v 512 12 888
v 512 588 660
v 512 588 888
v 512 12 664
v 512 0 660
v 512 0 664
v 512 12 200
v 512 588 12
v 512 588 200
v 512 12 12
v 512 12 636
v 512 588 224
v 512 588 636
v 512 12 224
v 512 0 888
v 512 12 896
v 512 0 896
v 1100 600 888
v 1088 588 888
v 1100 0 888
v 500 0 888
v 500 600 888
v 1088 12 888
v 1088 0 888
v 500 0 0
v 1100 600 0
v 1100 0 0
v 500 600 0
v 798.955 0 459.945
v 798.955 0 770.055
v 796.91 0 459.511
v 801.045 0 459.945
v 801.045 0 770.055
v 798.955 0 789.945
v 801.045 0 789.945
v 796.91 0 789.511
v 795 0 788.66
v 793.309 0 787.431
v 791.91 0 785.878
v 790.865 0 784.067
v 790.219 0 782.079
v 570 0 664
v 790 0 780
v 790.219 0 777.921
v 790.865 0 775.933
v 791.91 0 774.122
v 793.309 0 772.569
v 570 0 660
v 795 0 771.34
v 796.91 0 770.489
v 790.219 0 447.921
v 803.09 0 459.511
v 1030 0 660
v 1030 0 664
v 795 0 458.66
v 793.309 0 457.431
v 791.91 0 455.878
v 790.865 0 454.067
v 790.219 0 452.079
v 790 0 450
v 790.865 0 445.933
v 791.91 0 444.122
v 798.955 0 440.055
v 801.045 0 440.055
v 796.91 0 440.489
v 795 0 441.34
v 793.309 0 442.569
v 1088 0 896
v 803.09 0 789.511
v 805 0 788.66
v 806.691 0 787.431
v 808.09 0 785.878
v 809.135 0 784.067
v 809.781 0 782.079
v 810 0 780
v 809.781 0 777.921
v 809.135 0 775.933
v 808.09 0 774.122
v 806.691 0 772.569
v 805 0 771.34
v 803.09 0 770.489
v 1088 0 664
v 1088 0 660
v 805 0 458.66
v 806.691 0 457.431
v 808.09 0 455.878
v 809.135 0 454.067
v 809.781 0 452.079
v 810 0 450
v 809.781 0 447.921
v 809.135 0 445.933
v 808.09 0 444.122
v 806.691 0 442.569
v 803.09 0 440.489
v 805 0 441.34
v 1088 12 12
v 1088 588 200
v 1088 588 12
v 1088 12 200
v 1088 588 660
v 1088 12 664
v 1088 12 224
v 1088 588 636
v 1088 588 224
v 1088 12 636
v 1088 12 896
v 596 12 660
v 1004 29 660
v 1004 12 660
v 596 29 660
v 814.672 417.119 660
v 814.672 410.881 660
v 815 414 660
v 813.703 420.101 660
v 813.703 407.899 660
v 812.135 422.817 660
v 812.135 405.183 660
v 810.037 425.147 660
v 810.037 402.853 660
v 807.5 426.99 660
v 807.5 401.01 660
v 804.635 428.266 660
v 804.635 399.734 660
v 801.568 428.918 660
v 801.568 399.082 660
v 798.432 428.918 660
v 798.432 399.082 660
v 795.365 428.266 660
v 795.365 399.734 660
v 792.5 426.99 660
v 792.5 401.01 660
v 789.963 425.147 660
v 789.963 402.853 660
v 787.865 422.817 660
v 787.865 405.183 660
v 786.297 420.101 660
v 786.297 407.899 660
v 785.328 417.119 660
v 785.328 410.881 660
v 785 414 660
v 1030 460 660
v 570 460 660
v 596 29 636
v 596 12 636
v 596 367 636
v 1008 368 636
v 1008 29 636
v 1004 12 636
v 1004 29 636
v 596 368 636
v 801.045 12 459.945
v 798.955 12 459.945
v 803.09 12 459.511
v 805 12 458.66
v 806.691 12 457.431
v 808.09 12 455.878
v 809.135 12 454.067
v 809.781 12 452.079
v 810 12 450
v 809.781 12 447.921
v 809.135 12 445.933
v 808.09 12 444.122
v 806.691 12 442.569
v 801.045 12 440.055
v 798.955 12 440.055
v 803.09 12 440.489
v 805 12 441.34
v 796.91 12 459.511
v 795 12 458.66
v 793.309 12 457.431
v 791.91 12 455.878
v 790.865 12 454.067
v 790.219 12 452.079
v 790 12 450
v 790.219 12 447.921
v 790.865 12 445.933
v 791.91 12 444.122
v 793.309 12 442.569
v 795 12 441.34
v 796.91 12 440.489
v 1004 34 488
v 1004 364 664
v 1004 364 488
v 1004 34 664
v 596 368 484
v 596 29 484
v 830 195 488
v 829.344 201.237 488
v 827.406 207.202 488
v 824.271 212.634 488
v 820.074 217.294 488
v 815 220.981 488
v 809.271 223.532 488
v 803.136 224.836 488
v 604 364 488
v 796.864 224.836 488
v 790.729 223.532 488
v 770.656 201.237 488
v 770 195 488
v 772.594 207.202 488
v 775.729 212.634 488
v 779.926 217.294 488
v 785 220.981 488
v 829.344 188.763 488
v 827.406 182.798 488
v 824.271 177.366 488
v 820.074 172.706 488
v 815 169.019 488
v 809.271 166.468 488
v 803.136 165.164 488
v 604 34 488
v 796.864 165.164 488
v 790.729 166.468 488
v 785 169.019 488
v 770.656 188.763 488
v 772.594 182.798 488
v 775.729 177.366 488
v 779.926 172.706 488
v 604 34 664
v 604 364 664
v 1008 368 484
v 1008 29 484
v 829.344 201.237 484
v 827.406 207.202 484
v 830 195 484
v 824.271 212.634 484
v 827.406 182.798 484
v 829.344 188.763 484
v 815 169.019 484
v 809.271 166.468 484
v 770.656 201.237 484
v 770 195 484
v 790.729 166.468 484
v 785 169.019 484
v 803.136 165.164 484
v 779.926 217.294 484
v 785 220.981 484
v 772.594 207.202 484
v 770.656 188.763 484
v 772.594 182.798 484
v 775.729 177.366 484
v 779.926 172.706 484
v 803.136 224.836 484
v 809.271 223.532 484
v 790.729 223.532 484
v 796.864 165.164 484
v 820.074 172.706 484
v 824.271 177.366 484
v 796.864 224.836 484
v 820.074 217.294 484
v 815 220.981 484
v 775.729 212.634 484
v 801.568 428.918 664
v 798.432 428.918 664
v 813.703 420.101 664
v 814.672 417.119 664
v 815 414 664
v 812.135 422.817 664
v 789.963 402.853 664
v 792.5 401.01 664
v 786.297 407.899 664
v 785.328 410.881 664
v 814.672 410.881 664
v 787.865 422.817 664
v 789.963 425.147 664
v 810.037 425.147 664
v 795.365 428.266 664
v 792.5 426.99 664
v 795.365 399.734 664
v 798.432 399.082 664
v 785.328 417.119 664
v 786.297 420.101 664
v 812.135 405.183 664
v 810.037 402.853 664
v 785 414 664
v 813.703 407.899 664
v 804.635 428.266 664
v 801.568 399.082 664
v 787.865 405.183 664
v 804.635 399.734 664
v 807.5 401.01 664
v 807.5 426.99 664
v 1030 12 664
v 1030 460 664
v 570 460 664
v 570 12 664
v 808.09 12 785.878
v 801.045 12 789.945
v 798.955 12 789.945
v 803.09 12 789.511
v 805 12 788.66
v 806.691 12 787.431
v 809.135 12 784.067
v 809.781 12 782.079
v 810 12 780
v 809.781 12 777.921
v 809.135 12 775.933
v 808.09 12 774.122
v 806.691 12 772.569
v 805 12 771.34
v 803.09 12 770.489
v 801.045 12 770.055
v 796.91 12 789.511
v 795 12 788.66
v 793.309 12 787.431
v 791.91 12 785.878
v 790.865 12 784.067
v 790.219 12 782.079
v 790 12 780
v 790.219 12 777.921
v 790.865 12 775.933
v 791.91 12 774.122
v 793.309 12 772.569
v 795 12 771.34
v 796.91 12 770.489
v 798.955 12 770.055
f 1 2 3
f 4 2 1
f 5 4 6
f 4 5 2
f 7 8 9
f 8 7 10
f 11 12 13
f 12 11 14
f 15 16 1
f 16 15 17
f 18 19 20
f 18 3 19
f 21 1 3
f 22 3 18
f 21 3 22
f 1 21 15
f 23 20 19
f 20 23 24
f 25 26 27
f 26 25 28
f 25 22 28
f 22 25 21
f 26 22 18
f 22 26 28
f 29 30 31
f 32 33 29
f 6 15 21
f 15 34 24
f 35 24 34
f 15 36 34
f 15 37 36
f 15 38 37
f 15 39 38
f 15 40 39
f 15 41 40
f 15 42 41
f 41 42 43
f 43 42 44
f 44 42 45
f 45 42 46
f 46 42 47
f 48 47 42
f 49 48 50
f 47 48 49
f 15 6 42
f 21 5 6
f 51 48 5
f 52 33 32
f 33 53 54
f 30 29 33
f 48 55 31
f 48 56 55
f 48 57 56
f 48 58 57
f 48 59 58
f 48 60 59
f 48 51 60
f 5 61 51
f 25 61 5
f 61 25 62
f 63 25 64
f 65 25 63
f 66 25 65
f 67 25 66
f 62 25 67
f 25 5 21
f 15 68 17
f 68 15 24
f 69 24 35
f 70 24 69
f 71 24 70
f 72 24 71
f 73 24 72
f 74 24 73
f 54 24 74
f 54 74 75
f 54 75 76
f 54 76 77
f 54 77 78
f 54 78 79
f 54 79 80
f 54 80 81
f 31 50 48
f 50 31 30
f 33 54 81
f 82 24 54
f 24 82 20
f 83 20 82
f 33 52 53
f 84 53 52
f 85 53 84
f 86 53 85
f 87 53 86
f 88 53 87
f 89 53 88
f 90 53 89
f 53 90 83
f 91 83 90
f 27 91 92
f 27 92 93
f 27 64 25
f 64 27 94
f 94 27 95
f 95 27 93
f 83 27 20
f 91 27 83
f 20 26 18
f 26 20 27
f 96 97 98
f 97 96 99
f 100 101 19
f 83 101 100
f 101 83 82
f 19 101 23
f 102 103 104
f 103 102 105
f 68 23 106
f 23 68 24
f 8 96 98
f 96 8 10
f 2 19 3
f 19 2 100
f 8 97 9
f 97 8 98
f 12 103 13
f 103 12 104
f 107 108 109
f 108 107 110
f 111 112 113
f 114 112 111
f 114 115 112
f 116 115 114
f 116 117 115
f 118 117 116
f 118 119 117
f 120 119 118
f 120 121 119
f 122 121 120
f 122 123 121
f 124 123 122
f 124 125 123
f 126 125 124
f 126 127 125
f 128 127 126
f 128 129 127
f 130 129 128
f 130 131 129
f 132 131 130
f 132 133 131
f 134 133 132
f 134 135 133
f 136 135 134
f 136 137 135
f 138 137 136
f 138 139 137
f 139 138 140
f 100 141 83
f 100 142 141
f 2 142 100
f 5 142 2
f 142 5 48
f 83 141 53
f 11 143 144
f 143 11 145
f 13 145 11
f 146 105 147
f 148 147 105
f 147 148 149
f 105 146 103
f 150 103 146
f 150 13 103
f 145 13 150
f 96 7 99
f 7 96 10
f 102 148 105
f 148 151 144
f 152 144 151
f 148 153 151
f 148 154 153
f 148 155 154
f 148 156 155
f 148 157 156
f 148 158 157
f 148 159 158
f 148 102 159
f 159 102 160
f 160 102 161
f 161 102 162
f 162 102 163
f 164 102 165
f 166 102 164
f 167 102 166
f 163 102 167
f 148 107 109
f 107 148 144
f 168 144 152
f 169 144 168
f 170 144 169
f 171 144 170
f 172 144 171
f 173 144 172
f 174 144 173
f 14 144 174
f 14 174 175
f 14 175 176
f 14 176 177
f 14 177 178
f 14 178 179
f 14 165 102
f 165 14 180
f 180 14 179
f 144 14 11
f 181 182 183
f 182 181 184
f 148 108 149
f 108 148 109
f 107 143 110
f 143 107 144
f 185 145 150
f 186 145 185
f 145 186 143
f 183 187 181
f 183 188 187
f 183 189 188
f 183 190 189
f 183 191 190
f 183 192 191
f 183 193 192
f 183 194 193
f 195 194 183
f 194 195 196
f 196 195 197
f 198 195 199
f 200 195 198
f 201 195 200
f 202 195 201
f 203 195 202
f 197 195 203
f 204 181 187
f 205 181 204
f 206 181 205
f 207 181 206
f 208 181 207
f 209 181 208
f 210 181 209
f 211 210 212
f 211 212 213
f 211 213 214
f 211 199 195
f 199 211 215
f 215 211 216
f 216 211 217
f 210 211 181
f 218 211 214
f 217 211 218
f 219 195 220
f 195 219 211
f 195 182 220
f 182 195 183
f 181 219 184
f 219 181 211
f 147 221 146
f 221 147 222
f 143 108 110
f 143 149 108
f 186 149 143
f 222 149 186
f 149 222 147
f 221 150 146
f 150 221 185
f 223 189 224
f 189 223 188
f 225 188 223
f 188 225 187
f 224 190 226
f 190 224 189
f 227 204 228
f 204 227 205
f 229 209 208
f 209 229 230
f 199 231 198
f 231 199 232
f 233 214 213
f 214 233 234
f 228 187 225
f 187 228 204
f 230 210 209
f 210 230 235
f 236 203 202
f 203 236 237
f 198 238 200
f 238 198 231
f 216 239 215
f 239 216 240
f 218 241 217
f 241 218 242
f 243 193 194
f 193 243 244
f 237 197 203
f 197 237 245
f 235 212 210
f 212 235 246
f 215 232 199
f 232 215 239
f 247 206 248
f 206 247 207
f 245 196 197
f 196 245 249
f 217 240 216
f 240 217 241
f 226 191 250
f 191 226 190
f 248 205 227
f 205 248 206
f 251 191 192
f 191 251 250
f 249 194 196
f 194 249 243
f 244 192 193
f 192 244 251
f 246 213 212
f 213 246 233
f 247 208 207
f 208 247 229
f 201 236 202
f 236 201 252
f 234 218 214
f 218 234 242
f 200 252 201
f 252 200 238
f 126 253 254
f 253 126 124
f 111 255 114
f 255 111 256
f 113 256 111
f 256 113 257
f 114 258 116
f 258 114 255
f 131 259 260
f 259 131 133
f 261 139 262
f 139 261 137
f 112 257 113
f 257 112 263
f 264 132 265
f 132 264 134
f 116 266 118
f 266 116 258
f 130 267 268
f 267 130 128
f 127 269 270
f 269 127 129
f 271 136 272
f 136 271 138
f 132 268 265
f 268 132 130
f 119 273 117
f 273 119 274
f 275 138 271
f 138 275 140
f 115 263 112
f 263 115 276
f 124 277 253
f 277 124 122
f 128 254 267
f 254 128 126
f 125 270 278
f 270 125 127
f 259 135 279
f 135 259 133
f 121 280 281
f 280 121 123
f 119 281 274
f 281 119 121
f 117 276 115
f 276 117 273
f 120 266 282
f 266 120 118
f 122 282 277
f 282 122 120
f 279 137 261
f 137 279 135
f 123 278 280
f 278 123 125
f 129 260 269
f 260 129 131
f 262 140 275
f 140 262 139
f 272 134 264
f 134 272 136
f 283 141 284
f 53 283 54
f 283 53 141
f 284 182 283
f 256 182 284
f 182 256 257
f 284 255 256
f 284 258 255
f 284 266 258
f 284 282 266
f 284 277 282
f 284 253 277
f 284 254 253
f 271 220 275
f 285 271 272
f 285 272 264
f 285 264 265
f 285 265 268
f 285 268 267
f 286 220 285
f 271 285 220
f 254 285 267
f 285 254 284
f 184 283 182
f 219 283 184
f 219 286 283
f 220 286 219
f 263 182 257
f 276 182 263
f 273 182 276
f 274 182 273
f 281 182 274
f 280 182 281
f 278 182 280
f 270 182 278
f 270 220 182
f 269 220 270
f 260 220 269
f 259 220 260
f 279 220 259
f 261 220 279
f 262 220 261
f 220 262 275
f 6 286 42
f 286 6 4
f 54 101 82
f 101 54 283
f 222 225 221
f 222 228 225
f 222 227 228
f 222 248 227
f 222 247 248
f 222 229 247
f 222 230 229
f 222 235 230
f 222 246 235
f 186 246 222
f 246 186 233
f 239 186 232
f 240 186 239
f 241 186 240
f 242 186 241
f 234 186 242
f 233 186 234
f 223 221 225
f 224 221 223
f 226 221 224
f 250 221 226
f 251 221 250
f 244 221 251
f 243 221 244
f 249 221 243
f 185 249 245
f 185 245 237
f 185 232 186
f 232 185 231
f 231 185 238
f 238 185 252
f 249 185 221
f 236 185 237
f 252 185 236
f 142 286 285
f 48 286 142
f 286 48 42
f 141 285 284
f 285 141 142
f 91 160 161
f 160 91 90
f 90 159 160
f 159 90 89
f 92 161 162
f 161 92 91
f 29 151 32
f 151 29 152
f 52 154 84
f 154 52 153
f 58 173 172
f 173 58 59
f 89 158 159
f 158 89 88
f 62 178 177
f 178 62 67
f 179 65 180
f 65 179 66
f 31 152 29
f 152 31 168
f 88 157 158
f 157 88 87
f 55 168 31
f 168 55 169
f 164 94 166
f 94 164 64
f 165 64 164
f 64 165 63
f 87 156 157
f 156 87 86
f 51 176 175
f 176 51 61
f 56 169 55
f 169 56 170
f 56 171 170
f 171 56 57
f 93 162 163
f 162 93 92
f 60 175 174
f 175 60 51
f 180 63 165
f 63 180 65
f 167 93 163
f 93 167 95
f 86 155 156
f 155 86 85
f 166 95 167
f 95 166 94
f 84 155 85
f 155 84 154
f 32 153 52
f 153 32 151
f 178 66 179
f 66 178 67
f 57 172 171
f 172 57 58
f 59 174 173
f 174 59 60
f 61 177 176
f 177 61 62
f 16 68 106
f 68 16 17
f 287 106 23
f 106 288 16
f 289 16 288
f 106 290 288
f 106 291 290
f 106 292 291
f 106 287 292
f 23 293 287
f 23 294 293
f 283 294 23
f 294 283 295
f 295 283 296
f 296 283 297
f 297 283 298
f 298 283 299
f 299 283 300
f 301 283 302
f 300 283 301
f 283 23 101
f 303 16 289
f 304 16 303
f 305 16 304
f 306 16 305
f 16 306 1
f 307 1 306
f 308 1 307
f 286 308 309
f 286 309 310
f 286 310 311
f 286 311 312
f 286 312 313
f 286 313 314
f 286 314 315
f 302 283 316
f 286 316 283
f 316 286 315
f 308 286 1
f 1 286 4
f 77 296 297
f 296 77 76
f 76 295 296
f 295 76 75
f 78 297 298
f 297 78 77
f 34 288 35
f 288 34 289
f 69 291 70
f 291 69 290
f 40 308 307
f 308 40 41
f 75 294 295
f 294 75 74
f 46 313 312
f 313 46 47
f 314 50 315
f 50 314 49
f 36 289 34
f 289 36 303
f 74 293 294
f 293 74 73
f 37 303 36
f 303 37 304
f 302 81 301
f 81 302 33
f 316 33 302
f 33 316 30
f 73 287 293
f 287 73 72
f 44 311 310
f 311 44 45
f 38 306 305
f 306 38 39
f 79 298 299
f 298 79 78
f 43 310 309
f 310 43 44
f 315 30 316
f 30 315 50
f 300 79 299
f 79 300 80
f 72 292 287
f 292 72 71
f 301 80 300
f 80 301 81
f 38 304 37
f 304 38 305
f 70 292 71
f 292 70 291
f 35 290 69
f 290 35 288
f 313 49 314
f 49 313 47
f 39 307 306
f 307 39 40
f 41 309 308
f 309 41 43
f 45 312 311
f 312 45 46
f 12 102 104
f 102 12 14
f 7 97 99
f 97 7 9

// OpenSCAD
// file: sink.scad
/*

    Sink
    
    By Anton Augustsson


*/

module sink (
    xDrawer,yDrawer,zDrawer,
    ){
/*
    ---------- Local varibles ---------- 
*/

thickness = 4;
edge = 30;

length = 460;
width  = 460;
height = 180;

innerLength = 330;
innerWidth = 400;
        
x=xDrawer;
y=yDrawer;
z=zDrawer;

/*
    ---------- Code ---------- 
*/

translate([
    x,
    y,
    z]) 
difference () {
union () {
translate([
    0,
    0,
    0]) 
cube(size = [
    width,
    length,
    height]);

}

union () {

// Remove Sink
translate([
    edge+thickness,
    edge+thickness,
    thickness]) 
cube(size = [
    innerWidth,
    innerLength,
    height]);
    
// Remove left edge
translate([
    -thickness,
    -1,
    -thickness]) 
cube(size = [
    edge,
    length+2,
    height]);

// Remove right edge
translate([
    width+thickness*2-edge,
    -1,
    -thickness]) 
cube(size = [
    edge,
    length+2,
    height]);
    
// Remove front edge
translate([
    -1,
    -1,
    -thickness]) 
cube(size = [
    width+2,
    edge,
    height]);
    
// Remove front edge
translate([
    -1,
    innerLength+edge+thickness*2,
    -thickness]) 
cube(size = [
    width+2,
    edge+100,
    height]);

// Dranige    
translate([
    width/2,                   
    innerLength/2+edge,   
    -1
    ])  
cylinder(
    h = thickness+2,    
    r = 30
    );
    
// Hold 
translate([
    width/2,                   
    (innerLength+edge+thickness*2
    +length)/2,   
    height-thickness-1   
    ])  
cylinder(
    h = thickness+2,    
    r = 15        
    );      

}}}
    
/*
    ---------- Example ---------- 
*/


xDrawer=100;
yDrawer=10;
zDrawer=100;

sink (
    xDrawer,yDrawer,zDrawer
    );
// file: cabinet.scad
/*

    Cabinet
    
    By Anton Augustsson


*/

module cabinet (
    thickness,
    length,
    width,
    height
    ){
/*
    ---------- Local varibles ---------- 
*/



/*
    ---------- Code ---------- 
*/


union () {

// Left
translate([
    0,
    0,
    0]) 
cube(size = [
    thickness,
    width,
    height-thickness]);

// Right
translate([
    length-thickness,
    0,
    0]) 
cube(size = [
    thickness,
    width,
    height-thickness]);
    
// Bottom 
translate([
    thickness,
    0,
    0]) 
cube(size = [
    length
    -thickness*2,
    width-thickness,
    thickness]);

// Back
translate([
    thickness,
    width-thickness,
    0]) 
cube(size = [
    length
    -thickness*2,
    thickness,
    height-thickness]);
}}



/*
    ---------- Example ---------- 
*/


thickness = 12;

length = 600;
width  = 600;
height = 900;

cabinet (
    thickness,
    length,
    width,
    height
    );
// main file
/*

    Middle Section Table
    
    By Anton Augustsson


*/

use <cabinet.scad>;
use <sink.scad>;

module middleSectionTable (
    plywoodThickness,
    lengthMiddleSection,
    lengthSecondSection,
    length,
    widthCabinet,
    widthCabinetDoor,
    widthTable,
    width,
    heightTable,
    heightCabinet,
    x,y,z
    ){

/*
    ---------- Local varibles ---------- 
*/

thickness = plywoodThickness;

length = lengthMiddleSection;
width  = widthTable+widthCabinet;
height = heightTable;

sharpeningHeight=660;
        

/*
    ---------- Code ---------- 
*/


translate([
	x,
	y,
	z,])

union () {

cabinet (
    thickness,
    length,
    width,
    height
    );

difference () {

// Top shelf
translate([
    thickness,
    thickness,
    sharpeningHeight-thickness*2]) 
cube(size = [
    length-thickness*2,
    width-thickness,
    thickness*2]);

translate([
    length/2-(400+4*2)/2,
    -1,
    sharpeningHeight-thickness*2-1]) 
cube(size = [
    400+4*2,
    330+30+4*2,
    thickness*2+2]);
}

sink (
    length/2-460/2,
    0,
    sharpeningHeight-180+4
    );


// Bottom shelf
translate([
    thickness,
    thickness,
    200]) 
cube(size = [
    length-thickness*2,
    width-thickness,
    thickness*2]);

 
difference () {
// Door
translate([
    thickness,
    0,
    thickness]) 
cube(size = [
    length-thickness*2,
    thickness,
    sharpeningHeight-thickness]);

translate([
    length/2,                   
    -1,   
    height/2
    ])  
rotate([270,0,0])
cylinder(
    h = thickness+2,    
    r = 10        
    );      
}

difference () {
// Latch
translate([
    thickness,
    0,
    sharpeningHeight+4]) 
cube(size = [
    length-thickness*2,
    thickness,
    height-sharpeningHeight+4-thickness]);

translate([
    length/2,                   
    -1,   
    (height+sharpeningHeight)/2
    ])  
rotate([270,0,0])
cylinder(
    h = thickness+2,    
    r = 10        
    );      
}

}}



/*
    ---------- Example ---------- 
*/


plywoodThickness = 12;

lengthMiddleSection = 600;
lengthSecondSection = lengthMiddleSection/2;
lengthTirdSection   = 200;
length=lengthMiddleSection
    +lengthSecondSection*2
    +lengthTirdSection*2;

widthCabinet     = 300;
widthCabinetDoor = widthCabinet/3;
widthTable       = 300;
width            = widthCabinet+widthTable;

heightTable   = 900;
heightCabinet = 900;


x=lengthSecondSection+lengthTirdSection;
y=0;
z=0;

middleSectionTable (
    plywoodThickness,
    lengthMiddleSection,
    lengthSecondSection,
    length,
    widthCabinet,
    widthCabinetDoor,
    widthTable,
    width,
    heightTable,
    heightCabinet,
    x,y,z
    );
